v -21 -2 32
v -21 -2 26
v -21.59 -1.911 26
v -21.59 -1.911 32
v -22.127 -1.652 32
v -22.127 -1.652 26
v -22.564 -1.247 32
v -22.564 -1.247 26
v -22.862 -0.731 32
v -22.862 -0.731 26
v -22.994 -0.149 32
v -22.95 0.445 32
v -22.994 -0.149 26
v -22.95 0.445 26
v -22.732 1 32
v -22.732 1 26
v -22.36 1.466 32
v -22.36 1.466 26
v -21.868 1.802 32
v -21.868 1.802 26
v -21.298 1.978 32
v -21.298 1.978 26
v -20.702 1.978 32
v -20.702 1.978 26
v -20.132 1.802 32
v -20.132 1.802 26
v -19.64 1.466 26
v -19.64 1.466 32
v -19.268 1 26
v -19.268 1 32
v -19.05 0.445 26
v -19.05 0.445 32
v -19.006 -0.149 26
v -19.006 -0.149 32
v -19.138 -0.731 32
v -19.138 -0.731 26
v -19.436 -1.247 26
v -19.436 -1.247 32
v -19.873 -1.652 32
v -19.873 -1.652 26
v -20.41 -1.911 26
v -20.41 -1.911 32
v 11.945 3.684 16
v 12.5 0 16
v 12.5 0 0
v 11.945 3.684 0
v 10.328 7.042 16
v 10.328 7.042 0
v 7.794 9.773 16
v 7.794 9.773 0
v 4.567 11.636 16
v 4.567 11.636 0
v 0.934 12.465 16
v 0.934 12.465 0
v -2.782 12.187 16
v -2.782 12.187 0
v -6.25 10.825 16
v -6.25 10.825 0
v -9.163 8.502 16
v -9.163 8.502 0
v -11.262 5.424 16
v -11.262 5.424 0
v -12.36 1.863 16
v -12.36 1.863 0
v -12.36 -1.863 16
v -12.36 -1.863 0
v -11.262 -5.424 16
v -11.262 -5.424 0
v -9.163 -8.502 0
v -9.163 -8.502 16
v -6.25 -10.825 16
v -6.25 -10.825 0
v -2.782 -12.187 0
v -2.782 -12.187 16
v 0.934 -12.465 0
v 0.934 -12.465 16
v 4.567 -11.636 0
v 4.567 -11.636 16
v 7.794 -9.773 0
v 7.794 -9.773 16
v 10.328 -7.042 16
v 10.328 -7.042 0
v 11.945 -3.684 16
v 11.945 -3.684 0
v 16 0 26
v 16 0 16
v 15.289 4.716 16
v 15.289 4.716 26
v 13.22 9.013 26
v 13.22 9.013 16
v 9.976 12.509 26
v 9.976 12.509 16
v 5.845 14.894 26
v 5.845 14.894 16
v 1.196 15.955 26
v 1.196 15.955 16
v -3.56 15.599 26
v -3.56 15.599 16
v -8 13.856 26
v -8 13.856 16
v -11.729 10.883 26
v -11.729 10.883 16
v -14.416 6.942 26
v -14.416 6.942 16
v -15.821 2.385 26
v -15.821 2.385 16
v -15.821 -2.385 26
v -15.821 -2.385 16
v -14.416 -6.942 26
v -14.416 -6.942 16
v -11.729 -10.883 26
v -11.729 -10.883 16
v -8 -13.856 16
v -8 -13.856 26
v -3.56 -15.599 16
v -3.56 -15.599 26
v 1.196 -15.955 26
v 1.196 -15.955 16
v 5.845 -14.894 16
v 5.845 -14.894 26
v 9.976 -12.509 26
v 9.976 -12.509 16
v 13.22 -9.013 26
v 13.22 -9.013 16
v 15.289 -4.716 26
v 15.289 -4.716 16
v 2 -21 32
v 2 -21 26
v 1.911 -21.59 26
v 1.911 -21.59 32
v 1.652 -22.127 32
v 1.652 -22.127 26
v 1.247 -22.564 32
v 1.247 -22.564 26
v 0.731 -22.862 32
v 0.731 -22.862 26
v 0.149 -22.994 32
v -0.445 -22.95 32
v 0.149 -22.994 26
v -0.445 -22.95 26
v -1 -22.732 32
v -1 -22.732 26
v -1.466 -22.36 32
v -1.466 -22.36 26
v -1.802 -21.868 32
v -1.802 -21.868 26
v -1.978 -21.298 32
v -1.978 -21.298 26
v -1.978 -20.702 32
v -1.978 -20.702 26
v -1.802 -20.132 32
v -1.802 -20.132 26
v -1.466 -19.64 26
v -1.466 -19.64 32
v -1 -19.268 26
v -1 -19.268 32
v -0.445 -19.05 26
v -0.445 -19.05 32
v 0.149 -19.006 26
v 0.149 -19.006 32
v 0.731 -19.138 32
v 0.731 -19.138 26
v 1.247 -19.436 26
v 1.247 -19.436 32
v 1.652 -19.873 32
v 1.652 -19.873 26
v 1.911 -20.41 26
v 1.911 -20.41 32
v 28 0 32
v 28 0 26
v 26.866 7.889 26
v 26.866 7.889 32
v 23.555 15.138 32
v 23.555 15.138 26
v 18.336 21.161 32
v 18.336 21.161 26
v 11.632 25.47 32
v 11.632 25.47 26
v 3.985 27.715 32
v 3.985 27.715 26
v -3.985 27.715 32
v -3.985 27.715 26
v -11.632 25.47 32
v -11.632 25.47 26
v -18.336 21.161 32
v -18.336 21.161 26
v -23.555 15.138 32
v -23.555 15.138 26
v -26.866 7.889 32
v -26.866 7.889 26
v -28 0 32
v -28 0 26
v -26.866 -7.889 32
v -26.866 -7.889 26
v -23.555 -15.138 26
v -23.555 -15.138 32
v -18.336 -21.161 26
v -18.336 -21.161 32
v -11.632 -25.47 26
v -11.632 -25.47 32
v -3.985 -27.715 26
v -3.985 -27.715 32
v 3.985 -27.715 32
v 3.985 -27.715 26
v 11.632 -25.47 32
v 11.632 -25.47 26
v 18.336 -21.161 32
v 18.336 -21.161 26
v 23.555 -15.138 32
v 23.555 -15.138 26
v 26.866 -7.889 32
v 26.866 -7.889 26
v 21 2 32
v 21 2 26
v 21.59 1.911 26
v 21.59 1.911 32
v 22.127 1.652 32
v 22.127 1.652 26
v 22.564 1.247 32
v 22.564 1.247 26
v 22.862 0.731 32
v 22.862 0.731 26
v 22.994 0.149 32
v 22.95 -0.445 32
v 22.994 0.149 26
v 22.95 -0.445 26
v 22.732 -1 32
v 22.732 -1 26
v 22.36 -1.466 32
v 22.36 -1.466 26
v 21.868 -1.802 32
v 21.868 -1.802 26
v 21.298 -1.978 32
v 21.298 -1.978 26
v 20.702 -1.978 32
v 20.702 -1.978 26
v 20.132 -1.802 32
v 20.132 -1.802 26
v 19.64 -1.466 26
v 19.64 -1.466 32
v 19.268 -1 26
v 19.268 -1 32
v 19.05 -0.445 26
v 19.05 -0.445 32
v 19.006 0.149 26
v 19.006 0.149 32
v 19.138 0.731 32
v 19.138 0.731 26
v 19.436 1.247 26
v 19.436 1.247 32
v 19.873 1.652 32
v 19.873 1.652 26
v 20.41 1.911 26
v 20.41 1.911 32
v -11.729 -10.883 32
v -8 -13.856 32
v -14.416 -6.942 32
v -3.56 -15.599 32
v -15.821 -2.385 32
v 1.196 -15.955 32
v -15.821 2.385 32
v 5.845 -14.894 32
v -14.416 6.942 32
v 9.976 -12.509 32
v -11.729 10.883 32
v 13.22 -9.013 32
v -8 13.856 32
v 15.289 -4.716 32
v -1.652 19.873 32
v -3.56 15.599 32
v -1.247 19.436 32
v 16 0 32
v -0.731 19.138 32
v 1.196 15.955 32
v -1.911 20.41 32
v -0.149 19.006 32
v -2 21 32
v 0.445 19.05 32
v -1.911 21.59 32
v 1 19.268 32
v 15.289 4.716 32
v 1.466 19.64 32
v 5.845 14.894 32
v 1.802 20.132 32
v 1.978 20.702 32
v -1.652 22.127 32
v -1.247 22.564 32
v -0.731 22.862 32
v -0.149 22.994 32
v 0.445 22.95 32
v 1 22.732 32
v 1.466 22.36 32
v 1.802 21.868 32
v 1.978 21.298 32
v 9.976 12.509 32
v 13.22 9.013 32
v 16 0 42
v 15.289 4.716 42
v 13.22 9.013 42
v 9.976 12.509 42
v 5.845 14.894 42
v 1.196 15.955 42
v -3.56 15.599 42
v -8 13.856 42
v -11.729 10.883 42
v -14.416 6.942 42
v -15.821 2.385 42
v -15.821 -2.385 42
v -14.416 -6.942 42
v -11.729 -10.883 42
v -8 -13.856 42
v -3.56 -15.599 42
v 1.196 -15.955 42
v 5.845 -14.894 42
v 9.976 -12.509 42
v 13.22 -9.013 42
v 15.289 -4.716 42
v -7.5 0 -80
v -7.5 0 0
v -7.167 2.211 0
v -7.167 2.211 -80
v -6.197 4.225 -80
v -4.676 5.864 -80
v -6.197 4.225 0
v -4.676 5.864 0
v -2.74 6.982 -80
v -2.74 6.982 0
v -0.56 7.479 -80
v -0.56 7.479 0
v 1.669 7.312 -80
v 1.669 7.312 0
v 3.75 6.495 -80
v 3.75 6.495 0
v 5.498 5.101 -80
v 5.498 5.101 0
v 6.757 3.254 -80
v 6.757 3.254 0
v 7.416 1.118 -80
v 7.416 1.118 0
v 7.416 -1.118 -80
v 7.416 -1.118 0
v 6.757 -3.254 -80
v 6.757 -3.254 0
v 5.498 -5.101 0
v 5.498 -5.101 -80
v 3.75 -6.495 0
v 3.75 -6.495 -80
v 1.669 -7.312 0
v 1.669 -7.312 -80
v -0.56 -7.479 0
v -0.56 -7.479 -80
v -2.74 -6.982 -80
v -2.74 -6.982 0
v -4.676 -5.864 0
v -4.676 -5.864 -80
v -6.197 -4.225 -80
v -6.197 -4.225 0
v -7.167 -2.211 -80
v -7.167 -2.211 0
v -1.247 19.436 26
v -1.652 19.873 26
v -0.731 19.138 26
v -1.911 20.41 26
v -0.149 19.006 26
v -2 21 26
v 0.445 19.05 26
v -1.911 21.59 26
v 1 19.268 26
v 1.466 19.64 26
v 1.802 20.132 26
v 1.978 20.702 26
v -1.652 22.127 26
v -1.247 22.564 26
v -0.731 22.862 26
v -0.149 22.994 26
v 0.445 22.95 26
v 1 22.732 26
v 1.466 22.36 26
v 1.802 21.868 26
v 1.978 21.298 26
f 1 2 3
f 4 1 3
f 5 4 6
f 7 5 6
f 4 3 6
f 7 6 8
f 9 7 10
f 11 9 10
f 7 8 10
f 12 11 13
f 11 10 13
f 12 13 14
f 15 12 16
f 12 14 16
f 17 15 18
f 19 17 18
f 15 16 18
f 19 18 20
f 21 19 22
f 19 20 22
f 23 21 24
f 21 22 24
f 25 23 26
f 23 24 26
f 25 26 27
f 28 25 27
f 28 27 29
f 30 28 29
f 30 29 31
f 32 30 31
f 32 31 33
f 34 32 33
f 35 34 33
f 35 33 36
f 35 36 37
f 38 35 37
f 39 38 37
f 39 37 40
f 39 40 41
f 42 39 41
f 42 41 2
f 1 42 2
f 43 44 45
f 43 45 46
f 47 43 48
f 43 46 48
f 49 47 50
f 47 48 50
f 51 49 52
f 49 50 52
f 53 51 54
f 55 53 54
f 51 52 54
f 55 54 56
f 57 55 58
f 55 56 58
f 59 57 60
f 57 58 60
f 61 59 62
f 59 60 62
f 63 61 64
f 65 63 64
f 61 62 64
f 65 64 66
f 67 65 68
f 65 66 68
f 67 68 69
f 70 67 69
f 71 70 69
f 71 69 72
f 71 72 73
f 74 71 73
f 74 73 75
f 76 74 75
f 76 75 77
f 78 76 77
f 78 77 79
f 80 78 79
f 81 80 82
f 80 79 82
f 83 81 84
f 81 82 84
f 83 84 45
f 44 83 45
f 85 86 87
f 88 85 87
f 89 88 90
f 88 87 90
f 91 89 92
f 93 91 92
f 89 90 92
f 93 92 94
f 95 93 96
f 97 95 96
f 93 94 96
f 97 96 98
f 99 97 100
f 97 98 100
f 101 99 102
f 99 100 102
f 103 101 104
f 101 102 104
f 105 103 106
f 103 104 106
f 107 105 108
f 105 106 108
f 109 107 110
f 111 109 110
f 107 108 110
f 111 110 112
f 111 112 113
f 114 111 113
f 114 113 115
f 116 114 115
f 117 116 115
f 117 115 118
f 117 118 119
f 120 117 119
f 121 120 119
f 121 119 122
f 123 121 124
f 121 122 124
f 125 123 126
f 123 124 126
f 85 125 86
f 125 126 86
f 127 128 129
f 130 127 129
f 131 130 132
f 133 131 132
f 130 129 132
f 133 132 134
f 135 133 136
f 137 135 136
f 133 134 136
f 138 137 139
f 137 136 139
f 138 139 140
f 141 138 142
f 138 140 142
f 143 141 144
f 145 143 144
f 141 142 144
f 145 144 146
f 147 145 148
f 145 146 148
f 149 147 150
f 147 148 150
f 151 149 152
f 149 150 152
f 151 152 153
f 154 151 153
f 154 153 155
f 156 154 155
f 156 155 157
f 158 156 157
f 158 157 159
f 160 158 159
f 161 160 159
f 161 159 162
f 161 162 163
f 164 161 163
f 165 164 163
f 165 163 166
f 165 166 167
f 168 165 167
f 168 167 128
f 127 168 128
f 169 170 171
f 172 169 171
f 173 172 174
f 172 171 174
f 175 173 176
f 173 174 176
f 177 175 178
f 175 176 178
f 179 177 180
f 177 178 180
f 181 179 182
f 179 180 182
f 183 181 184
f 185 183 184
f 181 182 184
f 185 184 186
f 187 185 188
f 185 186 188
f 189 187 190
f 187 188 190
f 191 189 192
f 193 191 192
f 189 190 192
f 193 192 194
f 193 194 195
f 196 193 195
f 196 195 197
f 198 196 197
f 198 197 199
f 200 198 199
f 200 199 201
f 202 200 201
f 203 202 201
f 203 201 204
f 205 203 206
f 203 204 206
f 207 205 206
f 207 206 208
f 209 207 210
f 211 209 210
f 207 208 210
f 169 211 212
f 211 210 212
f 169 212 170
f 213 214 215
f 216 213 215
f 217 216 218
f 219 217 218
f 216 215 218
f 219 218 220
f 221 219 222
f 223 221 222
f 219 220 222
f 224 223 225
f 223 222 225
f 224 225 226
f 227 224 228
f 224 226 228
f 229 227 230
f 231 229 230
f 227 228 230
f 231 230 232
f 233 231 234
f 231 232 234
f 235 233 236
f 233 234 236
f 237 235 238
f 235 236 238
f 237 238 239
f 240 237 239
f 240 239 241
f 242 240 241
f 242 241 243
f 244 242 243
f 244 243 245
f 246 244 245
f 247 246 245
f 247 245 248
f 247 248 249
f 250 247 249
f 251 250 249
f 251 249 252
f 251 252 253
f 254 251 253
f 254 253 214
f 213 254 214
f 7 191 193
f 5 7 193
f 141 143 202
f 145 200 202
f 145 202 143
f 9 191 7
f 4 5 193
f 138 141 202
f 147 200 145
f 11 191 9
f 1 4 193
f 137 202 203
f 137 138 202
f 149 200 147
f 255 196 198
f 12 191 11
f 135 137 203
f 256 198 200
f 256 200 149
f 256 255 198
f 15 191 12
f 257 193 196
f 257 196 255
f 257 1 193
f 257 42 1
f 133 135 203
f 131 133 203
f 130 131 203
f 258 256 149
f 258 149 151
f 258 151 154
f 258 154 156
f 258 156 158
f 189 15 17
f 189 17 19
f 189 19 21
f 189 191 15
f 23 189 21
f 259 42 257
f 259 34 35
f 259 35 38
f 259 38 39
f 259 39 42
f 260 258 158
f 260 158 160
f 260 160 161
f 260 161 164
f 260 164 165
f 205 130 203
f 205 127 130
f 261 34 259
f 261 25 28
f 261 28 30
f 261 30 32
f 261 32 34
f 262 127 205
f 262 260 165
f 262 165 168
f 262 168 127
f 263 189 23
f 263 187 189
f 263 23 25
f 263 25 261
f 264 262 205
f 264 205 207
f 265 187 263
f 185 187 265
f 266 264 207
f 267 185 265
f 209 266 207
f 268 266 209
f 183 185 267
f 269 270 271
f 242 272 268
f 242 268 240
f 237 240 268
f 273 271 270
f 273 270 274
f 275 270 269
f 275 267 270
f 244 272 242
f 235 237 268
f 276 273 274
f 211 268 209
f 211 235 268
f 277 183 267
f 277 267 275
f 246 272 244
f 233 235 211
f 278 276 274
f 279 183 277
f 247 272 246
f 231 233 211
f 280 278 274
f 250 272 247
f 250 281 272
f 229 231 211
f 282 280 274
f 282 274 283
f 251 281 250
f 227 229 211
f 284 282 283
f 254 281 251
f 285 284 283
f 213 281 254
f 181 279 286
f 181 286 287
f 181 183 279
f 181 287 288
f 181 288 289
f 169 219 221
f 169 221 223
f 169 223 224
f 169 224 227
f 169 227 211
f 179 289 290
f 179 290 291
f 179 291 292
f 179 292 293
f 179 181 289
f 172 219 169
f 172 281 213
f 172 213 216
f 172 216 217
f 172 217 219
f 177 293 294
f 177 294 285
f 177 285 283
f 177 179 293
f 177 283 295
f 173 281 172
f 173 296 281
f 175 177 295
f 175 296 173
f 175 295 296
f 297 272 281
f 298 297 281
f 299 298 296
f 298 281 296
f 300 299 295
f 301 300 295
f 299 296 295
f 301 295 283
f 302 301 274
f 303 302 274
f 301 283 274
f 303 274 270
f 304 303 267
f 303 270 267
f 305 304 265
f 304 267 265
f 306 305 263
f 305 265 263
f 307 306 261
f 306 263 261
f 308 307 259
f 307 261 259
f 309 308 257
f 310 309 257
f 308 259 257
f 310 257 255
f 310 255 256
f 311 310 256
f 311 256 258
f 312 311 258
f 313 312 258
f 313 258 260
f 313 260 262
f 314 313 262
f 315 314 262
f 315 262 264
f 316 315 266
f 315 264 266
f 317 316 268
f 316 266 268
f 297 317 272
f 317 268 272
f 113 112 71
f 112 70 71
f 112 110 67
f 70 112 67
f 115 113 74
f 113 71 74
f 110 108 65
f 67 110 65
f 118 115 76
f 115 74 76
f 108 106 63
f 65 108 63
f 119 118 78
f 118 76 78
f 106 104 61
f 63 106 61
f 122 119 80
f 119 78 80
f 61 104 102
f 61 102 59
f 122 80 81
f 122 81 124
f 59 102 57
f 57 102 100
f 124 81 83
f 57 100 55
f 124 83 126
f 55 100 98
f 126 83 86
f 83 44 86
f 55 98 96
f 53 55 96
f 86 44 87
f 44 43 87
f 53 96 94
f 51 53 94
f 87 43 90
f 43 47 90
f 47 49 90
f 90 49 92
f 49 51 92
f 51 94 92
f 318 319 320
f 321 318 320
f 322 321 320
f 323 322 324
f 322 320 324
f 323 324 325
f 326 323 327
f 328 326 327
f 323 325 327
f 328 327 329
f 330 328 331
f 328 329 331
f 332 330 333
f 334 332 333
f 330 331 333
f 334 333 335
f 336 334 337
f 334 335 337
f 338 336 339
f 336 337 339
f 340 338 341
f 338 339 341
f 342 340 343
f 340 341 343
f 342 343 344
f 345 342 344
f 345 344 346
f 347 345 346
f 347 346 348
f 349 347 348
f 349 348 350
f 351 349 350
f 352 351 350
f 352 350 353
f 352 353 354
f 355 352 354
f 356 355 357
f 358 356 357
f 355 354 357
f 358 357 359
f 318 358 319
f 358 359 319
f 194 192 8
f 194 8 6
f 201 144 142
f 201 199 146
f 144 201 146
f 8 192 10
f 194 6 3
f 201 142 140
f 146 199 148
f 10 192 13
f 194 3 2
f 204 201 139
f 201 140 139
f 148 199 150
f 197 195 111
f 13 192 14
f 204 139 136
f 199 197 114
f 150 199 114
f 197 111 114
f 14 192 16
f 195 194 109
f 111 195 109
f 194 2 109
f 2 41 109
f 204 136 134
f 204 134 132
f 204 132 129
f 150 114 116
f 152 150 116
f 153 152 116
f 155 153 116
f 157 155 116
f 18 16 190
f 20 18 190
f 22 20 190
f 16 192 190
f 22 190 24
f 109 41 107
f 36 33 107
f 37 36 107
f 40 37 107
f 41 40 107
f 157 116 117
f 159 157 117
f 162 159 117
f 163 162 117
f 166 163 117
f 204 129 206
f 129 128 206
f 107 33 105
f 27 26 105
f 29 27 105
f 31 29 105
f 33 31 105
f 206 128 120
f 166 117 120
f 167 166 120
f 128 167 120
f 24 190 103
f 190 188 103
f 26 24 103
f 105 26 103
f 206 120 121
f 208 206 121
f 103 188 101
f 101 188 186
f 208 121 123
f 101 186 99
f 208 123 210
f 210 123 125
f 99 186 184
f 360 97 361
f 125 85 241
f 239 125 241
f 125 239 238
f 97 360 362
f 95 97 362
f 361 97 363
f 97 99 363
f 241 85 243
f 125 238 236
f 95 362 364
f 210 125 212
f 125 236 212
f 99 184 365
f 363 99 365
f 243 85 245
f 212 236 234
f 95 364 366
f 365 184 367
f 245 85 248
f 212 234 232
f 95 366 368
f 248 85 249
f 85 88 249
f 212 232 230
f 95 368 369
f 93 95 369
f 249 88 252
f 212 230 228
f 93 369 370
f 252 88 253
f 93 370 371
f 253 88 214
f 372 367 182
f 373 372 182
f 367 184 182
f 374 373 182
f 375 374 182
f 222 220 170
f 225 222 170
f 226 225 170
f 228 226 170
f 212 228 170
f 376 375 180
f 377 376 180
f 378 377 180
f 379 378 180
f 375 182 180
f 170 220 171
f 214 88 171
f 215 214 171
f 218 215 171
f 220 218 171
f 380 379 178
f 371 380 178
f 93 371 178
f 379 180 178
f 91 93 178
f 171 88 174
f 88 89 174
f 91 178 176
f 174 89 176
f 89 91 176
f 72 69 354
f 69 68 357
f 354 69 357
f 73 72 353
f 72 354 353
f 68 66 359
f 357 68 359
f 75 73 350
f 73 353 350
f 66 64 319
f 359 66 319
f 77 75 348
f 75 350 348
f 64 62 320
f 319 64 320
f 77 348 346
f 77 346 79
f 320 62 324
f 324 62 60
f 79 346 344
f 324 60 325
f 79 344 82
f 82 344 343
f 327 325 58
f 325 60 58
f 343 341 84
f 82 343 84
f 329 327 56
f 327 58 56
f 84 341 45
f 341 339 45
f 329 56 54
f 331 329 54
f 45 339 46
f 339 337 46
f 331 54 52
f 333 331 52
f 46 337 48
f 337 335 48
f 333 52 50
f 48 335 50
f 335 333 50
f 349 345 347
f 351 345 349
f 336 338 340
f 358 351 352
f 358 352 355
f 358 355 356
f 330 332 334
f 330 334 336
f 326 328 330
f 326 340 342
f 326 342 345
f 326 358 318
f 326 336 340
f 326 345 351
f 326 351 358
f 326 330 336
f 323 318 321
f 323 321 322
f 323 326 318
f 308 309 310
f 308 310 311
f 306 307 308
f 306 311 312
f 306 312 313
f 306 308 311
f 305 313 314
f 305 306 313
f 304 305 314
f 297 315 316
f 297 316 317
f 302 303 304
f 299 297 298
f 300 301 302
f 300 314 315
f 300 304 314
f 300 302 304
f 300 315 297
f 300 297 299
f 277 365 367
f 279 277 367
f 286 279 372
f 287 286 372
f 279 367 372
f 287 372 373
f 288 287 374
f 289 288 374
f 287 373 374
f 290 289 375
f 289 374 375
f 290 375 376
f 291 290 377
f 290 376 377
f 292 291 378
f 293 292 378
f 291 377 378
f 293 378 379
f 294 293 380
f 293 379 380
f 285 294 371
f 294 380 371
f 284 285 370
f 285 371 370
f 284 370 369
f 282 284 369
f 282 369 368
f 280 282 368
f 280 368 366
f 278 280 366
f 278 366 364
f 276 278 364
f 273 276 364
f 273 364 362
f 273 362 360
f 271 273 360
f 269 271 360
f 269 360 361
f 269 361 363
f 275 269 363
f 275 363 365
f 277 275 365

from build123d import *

# Parameters (mm, degrees)
SKETCH_1_R               = 12.5
EXTRUDE_1_DEPTH          = 16
SKETCH_2_R               = 16
EXTRUDE_2_DEPTH          = 10
SKETCH_3_R               = 28
EXTRUDE_3_DEPTH          = 6
SKETCH_6_R               = 2
CUT_EXTRUDE_1_DEPTH      = 10
PATTERN_CIRCULAR_2_COUNT = 4
SKETCH_8_R               = 16
EXTRUDE_5_DEPTH          = 10
SKETCH_7_R               = 7.5
EXTRUDE_6_DEPTH          = 80


with BuildPart() as part:
    # 草图1 → 凸台-拉伸1 (new body)
    with BuildSketch(Plane.XY):
        Circle(SKETCH_1_R)
    extrude(amount=EXTRUDE_1_DEPTH)

    # 草图2 → 凸台-拉伸2 (add)
    with BuildSketch(Plane.XY.offset(16)):
        Circle(SKETCH_2_R)
    extrude(amount=EXTRUDE_2_DEPTH)

    # 草图3 → 凸台-拉伸3 (add)
    with BuildSketch(Plane.XY.offset(26)):
        Circle(SKETCH_3_R)
    extrude(amount=EXTRUDE_3_DEPTH)

    # 草图6 → 切除-拉伸1 (cut)
    with BuildSketch(Plane(origin=(0, 0, 26), x_dir=(-1, 0, 0), z_dir=(0, 0, -1))):
        with Locations((0, 21)):
            Circle(SKETCH_6_R)
    cut_extrude_1 = extrude(amount=-CUT_EXTRUDE_1_DEPTH, mode=Mode.SUBTRACT)

    # 阵列(圆周)2: 切除-拉伸1 ×4 about axis
    pattern_circular_2_axis = Axis((0, 0, 0), (0, 0, 1))
    for i in range(1, PATTERN_CIRCULAR_2_COUNT):
        add(cut_extrude_1.rotate(pattern_circular_2_axis, i * 360 / PATTERN_CIRCULAR_2_COUNT), mode=Mode.SUBTRACT)

    # 草图8 → 凸台-拉伸5 (add)
    with BuildSketch(Plane.XY.offset(32)):
        Circle(SKETCH_8_R)
    extrude(amount=EXTRUDE_5_DEPTH)

    # 草图7 → 凸台-拉伸6 (add)
    with BuildSketch(Plane(origin=(0, 0, 0), x_dir=(-1, 0, 0), z_dir=(0, 0, -1))):
        Circle(SKETCH_7_R)
    extrude(amount=EXTRUDE_6_DEPTH)


solid = part.part
